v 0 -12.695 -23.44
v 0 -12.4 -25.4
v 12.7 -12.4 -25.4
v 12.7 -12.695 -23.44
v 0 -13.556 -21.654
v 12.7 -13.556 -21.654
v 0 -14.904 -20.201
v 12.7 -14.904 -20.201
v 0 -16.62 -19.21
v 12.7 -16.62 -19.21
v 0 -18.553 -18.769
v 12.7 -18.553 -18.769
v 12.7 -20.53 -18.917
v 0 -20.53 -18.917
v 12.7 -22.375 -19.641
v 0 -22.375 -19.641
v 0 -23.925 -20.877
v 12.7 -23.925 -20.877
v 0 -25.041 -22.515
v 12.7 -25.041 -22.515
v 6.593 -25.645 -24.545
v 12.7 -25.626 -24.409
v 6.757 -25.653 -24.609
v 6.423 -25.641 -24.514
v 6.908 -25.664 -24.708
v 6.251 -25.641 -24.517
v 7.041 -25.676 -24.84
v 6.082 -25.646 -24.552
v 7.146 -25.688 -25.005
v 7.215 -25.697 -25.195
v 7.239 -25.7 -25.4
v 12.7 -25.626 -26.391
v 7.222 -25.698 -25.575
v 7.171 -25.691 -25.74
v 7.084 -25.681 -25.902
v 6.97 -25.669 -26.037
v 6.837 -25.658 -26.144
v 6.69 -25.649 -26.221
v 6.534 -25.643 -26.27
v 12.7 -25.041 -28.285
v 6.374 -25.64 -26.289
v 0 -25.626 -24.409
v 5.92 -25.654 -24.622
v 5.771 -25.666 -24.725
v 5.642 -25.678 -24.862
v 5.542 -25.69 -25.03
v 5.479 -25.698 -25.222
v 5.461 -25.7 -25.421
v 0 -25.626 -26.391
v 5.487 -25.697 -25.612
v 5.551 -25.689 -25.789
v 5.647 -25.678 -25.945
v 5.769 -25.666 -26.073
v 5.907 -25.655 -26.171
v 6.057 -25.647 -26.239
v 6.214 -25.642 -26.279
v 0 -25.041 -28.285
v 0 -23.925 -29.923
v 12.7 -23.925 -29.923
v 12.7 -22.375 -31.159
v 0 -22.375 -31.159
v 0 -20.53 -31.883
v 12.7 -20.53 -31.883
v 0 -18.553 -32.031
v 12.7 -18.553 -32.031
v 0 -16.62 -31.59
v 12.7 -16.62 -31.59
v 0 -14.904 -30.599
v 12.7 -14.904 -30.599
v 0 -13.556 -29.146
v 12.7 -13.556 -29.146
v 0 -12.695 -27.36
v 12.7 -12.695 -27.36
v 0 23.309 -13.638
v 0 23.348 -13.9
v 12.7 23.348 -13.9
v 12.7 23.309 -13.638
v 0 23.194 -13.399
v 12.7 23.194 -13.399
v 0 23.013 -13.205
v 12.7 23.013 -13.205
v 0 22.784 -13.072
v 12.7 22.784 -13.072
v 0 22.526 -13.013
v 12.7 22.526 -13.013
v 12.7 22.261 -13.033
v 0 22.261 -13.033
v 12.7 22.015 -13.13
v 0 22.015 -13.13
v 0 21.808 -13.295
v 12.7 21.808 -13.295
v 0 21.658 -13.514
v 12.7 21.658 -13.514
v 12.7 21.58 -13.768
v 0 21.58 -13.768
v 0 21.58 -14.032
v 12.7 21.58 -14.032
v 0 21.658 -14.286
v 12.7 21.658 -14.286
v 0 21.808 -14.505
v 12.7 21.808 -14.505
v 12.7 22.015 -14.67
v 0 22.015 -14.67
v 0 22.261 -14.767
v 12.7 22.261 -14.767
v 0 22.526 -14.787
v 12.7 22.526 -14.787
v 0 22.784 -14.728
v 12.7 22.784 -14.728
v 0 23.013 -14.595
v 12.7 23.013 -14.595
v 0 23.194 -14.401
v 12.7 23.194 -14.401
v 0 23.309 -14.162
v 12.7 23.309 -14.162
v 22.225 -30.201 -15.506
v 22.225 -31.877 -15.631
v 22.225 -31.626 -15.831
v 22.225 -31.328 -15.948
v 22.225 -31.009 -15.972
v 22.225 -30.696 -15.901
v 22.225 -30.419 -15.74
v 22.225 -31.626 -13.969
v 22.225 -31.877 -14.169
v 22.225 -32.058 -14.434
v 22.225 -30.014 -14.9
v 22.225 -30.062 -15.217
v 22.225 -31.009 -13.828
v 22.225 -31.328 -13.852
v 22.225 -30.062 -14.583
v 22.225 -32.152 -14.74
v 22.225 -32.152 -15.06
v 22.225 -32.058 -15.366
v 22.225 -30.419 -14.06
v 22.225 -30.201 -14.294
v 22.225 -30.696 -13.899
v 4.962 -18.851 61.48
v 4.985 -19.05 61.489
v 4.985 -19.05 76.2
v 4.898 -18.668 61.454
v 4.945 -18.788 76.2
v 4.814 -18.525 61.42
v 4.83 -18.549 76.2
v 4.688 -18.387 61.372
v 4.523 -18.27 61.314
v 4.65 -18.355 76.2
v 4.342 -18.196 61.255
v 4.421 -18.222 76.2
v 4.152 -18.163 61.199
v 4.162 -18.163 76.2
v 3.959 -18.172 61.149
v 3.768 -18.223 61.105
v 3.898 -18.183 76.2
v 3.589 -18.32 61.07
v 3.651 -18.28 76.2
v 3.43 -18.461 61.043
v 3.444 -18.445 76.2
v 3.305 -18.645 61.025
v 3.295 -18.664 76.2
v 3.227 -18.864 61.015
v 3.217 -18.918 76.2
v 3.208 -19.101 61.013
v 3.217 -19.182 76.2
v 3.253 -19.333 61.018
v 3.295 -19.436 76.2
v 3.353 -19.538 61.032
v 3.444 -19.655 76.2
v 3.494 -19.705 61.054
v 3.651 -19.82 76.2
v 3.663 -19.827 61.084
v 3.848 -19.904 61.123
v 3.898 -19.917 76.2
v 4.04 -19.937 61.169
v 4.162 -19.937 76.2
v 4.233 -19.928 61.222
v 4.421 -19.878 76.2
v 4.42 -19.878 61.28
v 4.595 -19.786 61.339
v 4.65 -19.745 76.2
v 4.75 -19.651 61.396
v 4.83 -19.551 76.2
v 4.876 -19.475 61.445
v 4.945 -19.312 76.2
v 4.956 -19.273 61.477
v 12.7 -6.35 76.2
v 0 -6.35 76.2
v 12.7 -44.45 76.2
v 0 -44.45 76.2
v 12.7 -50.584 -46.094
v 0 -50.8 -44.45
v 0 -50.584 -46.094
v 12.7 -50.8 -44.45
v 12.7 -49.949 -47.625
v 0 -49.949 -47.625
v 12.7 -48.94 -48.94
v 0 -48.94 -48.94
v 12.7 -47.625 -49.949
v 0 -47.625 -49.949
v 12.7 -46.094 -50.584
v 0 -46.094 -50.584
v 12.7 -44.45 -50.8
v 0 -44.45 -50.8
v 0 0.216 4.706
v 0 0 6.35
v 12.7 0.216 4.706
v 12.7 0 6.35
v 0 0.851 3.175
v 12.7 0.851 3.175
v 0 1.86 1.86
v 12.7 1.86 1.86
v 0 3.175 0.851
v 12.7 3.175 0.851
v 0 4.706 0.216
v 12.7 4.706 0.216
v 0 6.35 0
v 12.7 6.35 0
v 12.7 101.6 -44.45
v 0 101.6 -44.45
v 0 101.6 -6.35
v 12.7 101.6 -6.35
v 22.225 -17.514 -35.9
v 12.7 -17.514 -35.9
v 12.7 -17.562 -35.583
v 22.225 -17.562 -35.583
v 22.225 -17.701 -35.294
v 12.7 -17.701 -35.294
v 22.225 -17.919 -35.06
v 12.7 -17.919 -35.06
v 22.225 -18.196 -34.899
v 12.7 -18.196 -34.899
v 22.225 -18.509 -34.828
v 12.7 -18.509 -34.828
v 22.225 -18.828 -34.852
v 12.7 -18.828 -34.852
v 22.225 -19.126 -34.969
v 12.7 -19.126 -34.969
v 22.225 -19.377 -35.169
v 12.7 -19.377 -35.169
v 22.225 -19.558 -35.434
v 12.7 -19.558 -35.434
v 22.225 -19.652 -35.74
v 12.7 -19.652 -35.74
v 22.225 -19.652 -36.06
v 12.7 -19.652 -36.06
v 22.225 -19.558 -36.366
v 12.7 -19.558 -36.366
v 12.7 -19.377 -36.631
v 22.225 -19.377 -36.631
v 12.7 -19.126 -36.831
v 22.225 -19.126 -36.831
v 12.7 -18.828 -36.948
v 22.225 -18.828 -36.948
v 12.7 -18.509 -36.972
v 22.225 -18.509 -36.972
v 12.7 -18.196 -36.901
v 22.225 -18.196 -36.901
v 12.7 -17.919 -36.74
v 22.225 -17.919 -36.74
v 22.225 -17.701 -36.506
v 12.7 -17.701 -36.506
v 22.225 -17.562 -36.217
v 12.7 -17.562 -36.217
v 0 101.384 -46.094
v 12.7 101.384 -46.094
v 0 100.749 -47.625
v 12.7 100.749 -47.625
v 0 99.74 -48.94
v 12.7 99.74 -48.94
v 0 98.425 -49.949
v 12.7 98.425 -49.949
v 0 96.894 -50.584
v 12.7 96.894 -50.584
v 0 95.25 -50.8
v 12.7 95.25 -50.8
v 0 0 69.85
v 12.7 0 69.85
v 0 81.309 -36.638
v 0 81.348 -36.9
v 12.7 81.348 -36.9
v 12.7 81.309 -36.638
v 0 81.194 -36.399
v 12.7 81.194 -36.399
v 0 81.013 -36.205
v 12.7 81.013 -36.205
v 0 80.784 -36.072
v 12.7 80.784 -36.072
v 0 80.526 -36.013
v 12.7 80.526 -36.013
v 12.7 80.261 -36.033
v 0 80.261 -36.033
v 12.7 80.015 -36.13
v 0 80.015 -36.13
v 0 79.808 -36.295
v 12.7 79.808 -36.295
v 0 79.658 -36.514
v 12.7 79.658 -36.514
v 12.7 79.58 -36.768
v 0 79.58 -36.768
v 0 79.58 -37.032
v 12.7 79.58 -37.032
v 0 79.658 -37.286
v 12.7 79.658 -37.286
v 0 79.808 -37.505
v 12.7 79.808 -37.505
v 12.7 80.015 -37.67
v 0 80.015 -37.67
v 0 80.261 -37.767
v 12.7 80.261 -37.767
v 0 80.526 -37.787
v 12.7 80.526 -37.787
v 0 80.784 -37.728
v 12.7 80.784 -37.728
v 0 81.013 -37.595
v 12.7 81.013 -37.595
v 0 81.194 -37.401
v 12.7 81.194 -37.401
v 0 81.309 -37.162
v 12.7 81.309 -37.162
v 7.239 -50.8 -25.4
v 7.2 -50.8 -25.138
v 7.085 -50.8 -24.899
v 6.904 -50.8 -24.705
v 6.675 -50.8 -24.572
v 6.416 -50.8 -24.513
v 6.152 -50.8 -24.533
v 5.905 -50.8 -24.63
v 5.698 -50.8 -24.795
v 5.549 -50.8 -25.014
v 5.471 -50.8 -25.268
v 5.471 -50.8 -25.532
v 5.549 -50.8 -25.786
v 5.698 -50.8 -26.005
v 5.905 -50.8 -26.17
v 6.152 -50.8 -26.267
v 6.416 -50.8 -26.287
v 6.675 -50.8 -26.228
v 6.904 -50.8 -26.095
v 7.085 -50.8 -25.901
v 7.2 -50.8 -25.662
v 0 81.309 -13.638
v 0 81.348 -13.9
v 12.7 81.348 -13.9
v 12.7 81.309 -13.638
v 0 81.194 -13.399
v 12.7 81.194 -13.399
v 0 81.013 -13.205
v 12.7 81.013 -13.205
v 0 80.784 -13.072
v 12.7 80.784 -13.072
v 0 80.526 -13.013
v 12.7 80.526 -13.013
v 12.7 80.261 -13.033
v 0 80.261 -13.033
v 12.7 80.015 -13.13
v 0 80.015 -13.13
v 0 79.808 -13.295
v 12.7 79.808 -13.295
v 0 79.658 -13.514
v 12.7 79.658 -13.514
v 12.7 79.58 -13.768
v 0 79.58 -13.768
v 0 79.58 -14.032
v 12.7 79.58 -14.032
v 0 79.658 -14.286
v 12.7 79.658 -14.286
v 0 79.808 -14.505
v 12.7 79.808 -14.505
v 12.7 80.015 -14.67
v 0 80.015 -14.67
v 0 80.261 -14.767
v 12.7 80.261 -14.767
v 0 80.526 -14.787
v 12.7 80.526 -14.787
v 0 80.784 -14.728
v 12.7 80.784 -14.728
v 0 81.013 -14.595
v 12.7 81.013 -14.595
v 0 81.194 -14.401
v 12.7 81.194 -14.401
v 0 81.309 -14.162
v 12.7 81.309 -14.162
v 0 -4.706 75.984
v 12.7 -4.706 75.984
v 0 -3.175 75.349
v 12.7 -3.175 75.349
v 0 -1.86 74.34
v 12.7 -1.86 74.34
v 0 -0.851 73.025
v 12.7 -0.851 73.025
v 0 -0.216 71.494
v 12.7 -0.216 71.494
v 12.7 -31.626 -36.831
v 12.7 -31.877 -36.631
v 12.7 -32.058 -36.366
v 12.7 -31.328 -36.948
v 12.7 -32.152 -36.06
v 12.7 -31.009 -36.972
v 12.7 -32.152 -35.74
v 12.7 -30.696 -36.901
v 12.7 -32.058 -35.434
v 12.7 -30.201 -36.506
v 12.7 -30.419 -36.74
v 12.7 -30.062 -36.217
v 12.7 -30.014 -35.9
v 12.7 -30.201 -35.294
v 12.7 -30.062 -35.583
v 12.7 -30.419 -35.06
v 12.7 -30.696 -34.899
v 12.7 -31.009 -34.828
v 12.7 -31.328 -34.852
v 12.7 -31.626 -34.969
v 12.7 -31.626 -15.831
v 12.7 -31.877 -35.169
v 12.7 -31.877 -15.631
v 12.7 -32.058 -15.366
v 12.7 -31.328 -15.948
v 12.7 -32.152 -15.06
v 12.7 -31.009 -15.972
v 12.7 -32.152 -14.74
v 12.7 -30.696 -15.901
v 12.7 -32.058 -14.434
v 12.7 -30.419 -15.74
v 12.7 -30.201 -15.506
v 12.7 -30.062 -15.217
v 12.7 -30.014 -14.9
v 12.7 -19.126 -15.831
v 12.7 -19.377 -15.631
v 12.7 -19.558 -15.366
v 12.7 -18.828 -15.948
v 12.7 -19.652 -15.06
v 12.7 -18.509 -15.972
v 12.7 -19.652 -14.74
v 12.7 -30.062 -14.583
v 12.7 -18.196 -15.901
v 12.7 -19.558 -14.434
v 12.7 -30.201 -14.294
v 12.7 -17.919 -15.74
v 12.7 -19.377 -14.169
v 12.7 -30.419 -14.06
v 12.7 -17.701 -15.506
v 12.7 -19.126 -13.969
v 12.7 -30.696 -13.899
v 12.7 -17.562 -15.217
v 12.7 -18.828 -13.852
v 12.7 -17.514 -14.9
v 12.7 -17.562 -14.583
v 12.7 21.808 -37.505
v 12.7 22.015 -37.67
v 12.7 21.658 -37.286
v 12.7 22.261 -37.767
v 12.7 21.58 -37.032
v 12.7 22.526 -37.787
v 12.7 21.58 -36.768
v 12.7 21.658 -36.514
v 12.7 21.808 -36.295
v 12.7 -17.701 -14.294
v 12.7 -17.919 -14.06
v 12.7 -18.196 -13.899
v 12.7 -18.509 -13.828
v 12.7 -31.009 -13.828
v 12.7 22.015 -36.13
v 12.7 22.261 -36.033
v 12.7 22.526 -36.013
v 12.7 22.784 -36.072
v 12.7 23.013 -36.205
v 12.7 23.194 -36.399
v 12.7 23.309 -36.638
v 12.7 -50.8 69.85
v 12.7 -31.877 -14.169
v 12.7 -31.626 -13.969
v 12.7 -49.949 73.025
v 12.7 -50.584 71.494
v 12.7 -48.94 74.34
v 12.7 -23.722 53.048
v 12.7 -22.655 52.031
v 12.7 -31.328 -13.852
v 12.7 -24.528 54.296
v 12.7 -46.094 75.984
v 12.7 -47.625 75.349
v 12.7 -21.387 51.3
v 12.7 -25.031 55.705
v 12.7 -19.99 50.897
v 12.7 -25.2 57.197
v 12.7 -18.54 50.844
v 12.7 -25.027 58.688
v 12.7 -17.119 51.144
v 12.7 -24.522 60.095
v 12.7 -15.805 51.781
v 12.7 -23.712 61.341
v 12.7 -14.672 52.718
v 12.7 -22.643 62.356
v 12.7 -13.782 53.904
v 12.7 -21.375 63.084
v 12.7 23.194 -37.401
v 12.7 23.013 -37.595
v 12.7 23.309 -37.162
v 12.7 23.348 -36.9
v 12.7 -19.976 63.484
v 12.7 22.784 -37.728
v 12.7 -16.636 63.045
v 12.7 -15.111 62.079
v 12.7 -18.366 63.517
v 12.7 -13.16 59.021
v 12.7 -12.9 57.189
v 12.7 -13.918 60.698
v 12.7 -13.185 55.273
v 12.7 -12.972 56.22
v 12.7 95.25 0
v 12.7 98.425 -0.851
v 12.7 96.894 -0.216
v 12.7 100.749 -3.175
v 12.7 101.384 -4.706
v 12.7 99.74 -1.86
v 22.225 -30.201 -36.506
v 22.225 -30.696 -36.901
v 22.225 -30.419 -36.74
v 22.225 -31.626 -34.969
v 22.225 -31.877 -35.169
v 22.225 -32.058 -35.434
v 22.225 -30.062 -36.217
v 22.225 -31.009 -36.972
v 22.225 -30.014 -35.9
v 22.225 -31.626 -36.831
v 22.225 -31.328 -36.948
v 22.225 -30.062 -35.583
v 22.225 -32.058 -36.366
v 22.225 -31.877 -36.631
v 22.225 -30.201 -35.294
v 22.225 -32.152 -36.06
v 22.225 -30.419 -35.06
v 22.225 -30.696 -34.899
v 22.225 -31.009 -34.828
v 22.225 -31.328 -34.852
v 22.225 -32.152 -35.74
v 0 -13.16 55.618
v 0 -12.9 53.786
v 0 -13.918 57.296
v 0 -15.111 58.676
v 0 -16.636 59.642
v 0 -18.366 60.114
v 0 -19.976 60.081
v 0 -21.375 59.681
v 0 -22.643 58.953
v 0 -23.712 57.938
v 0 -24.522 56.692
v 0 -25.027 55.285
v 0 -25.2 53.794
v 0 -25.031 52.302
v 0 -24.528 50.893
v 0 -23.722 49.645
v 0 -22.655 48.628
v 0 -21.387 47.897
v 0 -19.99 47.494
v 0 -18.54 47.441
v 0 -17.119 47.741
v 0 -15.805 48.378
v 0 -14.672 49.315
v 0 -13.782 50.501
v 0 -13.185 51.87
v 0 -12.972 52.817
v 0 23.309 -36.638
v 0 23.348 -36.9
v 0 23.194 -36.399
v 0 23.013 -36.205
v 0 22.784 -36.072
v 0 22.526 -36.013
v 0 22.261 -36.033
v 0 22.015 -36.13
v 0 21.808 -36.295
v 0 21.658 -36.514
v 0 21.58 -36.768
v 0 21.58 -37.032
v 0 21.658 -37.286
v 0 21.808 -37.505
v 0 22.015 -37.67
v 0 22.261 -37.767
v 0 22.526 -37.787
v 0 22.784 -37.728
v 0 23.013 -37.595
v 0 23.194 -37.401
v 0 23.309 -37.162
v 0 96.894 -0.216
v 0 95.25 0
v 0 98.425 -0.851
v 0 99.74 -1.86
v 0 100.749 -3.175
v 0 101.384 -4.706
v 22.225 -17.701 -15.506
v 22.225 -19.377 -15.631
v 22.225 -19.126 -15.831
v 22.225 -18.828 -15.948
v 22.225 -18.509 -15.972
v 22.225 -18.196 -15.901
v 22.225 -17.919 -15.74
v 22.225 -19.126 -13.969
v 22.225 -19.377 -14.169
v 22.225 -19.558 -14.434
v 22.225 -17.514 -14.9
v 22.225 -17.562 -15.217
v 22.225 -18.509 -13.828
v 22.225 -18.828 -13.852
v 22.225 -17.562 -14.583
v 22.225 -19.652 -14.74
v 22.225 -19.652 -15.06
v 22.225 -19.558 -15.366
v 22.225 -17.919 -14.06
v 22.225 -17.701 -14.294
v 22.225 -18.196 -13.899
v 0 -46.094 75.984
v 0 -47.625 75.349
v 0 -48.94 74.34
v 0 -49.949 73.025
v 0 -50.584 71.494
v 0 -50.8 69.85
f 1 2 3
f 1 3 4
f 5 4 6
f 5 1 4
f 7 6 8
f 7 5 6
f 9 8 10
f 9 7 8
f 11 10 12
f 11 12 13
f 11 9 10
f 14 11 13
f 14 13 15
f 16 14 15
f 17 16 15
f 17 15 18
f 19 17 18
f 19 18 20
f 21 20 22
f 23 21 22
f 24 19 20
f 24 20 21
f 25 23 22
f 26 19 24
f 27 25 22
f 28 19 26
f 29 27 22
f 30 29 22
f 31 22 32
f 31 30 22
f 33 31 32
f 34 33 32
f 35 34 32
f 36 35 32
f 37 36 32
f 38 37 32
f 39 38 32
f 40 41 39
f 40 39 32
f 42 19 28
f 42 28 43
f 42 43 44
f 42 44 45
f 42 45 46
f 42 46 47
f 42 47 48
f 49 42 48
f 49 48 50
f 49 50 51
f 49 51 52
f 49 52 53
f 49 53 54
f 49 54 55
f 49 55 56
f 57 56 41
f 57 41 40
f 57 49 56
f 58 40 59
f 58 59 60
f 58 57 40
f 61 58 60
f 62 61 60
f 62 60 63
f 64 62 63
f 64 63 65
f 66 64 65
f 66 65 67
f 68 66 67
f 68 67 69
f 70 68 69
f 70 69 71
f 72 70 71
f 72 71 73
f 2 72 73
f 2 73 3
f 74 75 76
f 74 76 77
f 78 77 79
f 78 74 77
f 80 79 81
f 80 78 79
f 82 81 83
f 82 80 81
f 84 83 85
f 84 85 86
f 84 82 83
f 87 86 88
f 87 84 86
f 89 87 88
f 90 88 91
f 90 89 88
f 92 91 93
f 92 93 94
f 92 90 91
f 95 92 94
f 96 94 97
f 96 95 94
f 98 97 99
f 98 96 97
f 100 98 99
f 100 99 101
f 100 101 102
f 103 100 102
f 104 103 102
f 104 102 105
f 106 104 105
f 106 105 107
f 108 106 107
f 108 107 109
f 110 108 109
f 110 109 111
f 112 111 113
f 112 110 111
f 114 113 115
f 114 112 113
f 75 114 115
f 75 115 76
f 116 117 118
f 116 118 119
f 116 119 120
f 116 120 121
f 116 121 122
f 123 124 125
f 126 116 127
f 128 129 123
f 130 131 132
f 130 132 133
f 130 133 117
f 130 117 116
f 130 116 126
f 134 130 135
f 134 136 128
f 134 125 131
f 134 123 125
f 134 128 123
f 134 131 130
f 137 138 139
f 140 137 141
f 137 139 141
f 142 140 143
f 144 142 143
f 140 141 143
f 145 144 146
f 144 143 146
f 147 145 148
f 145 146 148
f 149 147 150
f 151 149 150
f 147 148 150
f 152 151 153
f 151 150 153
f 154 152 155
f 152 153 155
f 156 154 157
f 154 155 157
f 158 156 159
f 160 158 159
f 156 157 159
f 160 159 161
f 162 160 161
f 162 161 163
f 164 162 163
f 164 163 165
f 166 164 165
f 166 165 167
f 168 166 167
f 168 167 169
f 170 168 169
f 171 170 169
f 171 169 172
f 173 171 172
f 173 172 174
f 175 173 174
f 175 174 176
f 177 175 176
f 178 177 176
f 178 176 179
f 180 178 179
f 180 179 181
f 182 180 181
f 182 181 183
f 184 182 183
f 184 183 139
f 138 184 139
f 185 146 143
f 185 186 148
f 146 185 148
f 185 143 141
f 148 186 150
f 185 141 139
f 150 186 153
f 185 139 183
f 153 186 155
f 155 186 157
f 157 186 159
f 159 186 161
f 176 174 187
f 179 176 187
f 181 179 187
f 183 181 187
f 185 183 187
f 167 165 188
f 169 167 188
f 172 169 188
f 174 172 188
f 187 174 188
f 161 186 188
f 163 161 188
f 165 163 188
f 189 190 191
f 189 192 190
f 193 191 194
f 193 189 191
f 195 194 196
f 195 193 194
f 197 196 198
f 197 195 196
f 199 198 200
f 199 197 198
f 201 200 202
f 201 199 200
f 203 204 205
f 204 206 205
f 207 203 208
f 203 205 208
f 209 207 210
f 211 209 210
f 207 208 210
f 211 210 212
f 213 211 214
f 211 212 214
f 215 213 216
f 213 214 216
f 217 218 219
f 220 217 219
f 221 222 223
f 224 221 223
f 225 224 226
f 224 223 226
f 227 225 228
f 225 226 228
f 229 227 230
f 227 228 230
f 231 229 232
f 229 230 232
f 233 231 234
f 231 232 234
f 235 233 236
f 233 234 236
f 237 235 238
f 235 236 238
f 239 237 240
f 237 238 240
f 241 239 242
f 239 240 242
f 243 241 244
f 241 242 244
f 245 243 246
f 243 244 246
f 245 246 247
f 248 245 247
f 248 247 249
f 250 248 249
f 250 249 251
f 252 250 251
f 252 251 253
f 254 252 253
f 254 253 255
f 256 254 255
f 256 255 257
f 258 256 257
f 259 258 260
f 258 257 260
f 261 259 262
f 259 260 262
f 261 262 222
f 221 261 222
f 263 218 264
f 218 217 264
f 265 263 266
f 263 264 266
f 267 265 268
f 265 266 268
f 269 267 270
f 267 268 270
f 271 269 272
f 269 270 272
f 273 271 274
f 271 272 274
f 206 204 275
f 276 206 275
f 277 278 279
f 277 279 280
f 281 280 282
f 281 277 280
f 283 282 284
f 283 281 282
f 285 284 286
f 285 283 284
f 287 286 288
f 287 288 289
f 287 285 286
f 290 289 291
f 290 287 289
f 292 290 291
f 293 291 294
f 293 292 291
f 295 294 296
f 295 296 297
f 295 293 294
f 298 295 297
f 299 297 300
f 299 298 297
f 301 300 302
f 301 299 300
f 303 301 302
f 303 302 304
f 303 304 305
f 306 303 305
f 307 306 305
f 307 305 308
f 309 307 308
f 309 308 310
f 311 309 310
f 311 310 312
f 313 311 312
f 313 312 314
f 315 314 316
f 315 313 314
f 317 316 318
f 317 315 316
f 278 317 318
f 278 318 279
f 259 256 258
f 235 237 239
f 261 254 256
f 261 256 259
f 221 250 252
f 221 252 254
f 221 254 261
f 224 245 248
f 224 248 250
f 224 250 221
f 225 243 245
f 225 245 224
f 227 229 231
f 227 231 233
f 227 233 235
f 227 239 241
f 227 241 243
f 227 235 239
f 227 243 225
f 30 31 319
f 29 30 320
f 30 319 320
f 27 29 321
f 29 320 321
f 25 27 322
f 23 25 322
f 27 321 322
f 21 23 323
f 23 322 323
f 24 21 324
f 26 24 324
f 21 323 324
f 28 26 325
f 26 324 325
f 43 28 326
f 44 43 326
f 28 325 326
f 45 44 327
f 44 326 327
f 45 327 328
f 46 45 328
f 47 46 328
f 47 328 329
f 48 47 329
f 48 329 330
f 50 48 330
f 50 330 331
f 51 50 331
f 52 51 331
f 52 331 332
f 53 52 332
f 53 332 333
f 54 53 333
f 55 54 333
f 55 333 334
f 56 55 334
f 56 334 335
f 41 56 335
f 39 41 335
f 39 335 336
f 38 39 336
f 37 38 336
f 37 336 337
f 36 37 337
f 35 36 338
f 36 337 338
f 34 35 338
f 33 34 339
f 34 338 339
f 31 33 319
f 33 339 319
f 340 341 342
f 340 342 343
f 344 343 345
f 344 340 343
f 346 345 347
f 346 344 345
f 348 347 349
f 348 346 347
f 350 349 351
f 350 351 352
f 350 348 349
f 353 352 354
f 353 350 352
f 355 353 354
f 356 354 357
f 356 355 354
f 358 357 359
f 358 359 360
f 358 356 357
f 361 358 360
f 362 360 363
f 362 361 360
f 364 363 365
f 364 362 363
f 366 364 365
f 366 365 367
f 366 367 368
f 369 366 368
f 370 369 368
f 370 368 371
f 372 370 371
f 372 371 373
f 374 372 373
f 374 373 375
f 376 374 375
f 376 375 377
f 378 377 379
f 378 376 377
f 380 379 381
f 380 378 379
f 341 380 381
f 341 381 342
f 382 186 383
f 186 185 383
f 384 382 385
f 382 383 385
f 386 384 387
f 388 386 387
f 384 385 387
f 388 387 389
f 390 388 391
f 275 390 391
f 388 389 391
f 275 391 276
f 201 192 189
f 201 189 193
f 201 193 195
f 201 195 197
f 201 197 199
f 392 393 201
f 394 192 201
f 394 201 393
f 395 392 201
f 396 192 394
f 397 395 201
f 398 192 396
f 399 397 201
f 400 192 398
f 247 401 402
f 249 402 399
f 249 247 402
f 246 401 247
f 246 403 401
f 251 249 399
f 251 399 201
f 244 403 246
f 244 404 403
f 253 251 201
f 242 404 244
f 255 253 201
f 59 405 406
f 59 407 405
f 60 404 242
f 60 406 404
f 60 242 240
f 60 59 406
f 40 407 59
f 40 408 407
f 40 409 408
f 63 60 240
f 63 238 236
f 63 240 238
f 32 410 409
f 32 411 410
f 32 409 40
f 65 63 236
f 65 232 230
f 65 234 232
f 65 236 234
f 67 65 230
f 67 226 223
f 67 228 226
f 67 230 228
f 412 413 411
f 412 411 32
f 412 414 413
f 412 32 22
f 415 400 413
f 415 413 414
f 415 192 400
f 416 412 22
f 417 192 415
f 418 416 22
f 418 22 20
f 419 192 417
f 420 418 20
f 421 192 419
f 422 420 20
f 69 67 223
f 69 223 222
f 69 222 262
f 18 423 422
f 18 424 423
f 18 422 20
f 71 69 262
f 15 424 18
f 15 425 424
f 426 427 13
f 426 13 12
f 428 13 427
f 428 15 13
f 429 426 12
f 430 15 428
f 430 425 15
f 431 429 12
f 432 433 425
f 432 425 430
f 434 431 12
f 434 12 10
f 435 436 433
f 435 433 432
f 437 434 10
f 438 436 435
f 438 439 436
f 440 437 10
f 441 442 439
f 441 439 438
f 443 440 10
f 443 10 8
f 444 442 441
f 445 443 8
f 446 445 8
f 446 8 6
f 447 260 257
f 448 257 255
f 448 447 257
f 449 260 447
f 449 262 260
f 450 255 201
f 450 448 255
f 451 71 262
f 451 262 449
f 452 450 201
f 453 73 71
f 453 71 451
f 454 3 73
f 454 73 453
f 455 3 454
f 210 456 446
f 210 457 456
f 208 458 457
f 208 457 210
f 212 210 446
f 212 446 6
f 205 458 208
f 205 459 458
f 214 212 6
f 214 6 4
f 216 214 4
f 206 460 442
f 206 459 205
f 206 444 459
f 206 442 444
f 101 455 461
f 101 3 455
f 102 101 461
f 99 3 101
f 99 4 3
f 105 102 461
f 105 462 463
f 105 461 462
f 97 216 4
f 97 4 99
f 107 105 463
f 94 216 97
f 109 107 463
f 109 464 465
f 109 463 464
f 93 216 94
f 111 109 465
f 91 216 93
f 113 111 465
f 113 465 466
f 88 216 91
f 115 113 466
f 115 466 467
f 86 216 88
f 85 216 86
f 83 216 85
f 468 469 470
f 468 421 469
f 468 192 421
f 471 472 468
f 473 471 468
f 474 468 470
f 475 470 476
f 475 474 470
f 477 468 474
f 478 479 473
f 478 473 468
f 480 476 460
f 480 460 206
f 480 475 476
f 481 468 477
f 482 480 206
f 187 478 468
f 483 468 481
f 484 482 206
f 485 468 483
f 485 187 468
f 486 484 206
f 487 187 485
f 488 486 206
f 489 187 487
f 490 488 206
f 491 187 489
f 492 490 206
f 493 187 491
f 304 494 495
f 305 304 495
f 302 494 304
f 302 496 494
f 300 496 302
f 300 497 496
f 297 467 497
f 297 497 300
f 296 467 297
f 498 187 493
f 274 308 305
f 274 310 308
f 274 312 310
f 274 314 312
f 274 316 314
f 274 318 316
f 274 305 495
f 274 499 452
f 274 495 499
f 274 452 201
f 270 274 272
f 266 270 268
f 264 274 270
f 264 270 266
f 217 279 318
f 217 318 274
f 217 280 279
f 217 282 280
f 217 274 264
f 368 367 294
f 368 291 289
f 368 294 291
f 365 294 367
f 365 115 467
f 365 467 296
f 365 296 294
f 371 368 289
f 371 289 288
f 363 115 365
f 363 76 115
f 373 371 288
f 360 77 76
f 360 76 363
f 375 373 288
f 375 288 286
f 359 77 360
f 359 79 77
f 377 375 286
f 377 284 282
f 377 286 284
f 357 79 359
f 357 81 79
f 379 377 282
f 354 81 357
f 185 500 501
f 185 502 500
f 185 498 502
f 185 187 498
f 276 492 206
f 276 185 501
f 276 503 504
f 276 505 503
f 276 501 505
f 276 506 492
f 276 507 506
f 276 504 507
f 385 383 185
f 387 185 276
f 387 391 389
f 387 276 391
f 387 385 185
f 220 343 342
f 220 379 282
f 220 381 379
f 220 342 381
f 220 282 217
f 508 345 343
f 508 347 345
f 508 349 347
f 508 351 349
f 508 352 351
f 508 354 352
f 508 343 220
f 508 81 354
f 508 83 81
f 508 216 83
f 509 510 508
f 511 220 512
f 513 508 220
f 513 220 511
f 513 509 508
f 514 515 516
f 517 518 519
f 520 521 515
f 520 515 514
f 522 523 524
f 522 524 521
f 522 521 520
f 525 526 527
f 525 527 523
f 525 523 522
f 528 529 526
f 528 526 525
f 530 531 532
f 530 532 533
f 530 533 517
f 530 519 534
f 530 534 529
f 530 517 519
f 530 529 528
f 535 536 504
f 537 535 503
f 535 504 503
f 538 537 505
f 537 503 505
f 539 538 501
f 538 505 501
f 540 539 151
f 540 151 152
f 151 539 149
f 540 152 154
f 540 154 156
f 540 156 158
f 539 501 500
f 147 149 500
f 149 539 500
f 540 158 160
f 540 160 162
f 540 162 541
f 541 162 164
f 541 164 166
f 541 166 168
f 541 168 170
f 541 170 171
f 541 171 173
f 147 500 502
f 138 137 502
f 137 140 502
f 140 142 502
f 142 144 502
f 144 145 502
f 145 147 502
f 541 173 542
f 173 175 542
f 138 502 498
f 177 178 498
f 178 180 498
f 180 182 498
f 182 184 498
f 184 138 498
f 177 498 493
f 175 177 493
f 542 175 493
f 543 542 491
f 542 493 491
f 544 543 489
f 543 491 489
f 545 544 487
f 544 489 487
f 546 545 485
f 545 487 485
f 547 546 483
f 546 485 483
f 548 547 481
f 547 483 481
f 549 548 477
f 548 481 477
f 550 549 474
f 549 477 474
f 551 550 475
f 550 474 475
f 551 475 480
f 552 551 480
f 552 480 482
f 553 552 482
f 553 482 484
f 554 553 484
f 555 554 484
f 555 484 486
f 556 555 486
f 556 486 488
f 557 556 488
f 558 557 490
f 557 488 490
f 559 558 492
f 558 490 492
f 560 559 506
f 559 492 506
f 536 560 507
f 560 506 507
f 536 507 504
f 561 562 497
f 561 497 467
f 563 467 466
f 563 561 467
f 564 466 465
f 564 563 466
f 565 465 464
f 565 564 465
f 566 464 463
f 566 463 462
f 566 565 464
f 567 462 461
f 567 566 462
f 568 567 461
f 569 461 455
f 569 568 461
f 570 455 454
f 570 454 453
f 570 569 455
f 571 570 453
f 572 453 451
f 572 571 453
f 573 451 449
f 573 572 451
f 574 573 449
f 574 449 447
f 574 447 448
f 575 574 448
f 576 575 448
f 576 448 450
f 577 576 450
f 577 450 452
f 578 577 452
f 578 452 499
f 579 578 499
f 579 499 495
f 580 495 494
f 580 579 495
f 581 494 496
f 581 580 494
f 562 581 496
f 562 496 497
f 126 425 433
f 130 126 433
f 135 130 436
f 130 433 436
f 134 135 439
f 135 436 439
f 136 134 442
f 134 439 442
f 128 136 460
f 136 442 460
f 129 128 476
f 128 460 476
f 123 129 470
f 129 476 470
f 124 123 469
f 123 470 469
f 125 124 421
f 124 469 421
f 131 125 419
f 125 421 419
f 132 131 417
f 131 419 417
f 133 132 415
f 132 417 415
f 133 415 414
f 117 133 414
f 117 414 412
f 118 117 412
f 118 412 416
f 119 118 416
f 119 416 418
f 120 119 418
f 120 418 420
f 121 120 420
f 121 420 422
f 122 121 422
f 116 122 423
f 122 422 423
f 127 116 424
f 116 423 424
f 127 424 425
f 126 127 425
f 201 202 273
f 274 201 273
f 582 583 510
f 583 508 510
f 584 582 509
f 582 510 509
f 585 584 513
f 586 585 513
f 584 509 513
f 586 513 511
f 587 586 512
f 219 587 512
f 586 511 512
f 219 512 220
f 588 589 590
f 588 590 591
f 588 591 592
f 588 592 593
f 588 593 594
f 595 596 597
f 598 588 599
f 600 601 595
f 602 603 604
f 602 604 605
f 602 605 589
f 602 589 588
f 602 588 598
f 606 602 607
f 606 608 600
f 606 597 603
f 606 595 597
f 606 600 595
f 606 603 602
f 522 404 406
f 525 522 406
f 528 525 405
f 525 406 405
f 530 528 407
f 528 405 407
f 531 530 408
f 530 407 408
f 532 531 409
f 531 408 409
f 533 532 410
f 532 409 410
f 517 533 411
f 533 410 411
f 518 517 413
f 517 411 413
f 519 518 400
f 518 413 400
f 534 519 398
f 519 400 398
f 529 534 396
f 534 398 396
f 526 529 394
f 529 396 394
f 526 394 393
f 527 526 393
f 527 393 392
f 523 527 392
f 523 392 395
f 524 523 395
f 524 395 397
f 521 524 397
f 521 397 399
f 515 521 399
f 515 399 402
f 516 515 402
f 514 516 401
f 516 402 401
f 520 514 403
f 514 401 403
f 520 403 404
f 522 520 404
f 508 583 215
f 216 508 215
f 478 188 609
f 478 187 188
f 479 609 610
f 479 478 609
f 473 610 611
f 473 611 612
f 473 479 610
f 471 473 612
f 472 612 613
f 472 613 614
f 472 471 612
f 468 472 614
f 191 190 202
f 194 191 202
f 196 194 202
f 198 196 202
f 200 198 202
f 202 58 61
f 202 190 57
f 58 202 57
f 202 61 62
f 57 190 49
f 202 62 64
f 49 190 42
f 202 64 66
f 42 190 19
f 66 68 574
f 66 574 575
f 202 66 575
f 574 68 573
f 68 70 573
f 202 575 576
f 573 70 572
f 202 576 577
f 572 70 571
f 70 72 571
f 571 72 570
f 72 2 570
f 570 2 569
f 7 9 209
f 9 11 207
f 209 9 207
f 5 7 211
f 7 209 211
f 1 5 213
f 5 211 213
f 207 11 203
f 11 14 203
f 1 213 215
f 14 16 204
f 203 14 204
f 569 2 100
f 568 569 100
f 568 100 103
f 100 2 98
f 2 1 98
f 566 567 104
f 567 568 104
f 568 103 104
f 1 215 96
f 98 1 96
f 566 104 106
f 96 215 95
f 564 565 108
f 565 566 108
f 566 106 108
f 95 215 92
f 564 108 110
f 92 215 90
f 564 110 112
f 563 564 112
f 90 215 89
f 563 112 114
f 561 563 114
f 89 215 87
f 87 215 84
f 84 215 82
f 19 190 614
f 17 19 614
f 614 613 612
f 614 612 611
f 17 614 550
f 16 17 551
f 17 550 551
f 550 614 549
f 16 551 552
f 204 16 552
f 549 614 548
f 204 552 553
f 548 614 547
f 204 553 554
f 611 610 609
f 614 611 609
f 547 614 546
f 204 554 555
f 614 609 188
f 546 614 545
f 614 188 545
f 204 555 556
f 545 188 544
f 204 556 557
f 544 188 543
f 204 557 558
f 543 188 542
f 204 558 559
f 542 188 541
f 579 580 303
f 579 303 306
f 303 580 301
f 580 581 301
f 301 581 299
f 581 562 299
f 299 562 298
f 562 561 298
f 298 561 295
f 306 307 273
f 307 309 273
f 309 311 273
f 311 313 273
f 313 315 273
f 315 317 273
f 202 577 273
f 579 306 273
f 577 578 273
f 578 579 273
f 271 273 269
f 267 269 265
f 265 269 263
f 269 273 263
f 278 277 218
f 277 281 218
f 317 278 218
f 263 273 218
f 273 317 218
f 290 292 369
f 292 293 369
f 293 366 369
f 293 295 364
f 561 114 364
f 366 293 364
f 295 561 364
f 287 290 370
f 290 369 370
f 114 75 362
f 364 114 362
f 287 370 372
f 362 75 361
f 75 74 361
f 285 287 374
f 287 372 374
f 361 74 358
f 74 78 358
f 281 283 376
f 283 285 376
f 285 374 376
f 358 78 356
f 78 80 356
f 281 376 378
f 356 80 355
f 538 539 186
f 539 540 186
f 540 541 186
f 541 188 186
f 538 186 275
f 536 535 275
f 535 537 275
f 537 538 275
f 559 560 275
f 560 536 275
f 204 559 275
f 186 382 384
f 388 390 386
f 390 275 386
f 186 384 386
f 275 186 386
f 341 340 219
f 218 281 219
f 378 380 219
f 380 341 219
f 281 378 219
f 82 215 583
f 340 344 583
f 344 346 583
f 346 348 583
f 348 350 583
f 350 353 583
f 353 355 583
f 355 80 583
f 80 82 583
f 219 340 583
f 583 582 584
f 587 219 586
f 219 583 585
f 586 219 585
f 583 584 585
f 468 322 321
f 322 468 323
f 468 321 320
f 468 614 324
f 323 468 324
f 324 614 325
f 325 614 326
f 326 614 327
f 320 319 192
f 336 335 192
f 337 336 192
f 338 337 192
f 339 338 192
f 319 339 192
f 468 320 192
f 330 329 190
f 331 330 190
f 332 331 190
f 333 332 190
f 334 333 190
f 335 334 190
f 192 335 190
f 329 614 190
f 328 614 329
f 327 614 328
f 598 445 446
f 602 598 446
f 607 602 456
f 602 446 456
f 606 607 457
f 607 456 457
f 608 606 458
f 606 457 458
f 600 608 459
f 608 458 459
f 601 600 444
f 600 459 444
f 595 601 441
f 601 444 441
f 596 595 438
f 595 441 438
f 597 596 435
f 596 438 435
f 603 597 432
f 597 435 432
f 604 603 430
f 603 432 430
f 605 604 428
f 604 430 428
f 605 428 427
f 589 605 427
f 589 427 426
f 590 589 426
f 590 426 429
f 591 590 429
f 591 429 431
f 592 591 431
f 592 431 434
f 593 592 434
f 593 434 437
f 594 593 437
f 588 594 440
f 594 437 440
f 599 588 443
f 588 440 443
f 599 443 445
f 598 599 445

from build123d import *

# Parameters (mm, degrees)
F0_R      = 6.65
F0_R_2    = 0.889
F1_DEPTH  = 12.7
F2_R      = 1.075
F3_DEPTH  = 9.525
F4_R      = 6.35
F5_R      = 6.35
F6_R      = 6.35
F12_R     = 6.15
F14_R     = 0.889
F15_DEPTH = 15.1883232269
F16_R     = 0.889
F17_DEPTH = 25.1606906232


with BuildPart() as f1:
    # F0 (on Right) → F1 (new body)
    with BuildSketch(Plane.YZ):
        Polygon((0, 76.2), (-50.8, 76.2), (-50.8, -50.8), (101.6, -50.8), (101.6, 0), (0, 0), align=None)
        with Locations((-19.05, -25.4)):
            Circle(F0_R, mode=Mode.SUBTRACT)
        with Locations((22.4592145532, -36.9)):
            Circle(F0_R_2, mode=Mode.SUBTRACT)
        with Locations((22.4592145532, -13.9)):
            Circle(F0_R_2, mode=Mode.SUBTRACT)
        with Locations((80.4592145532, -36.9)):
            Circle(F0_R_2, mode=Mode.SUBTRACT)
        with Locations((80.4592145532, -13.9)):
            Circle(F0_R_2, mode=Mode.SUBTRACT)
    extrude(amount=F1_DEPTH)

    # F2 (on face) → F3 (join)
    with BuildSketch(Plane.YZ.offset(12.7)):
        with Locations((-31.0889787972, -14.9)):
            Circle(F2_R)
        with Locations((-18.5889787972, -14.9)):
            Circle(F2_R)
        with Locations((-18.5889787972, -35.9)):
            Circle(F2_R)
        with Locations((-31.0889787972, -35.9)):
            Circle(F2_R)
    extrude(amount=F3_DEPTH)

    # F4
    f4_edges = [f1.edges().sort_by_distance(p)[0] for p in [
        (6.35, 0, 0),
    ]]
    fillet(f4_edges, radius=F4_R)

    # F5
    f5_edges = [f1.edges().sort_by_distance(p)[0] for p in [
        (6.35, -50.8, -50.8),
        (6.35, -50.8, 76.2),
        (6.35, 101.6, -50.8),
    ]]
    fillet(f5_edges, radius=F5_R)

    # F6
    f6_edges = [f1.edges().sort_by_distance(p)[0] for p in [
        (6.35, 0, 76.2),
        (6.35, 101.6, 0),
    ]]
    fillet(f6_edges, radius=F6_R)

    # F13: sweep along a path in F9
    with BuildLine(Plane(origin=(0, -19.05, 0), x_dir=(-1, 0, 0), z_dir=(0, 1, 0))) as f13_path:
        Line((69.4630440448, 35.1738945205), (-53.2095358939, 68.0439132485))
    # F12 (on plane+point) → F13 (sweep, cut)
    with BuildSketch(Plane(origin=(66.6561511629, 0, 17.8604618747), x_dir=(0, 1, 0), z_dir=(0.9659258263, 0, 0.2588190451))):
        with Locations((-19.05, 51.9537318581)):
            Circle(F12_R)
    sweep(path=f13_path.line, mode=Mode.SUBTRACT)

    # F14 (on face) → F15 (cut, through all)
    with BuildSketch(Plane.XY.offset(76.2)):
        with Locations((4.0958291739, -19.05)):
            Circle(F14_R)
    extrude(amount=-F15_DEPTH, mode=Mode.SUBTRACT)

    # F16 (on face) → F17 (cut, through all)
    with BuildSketch(Plane.XZ.offset(50.8)):
        with Locations((6.35, -25.4)):
            Circle(F16_R)
    extrude(amount=-F17_DEPTH, mode=Mode.SUBTRACT)


solid = f1.part
